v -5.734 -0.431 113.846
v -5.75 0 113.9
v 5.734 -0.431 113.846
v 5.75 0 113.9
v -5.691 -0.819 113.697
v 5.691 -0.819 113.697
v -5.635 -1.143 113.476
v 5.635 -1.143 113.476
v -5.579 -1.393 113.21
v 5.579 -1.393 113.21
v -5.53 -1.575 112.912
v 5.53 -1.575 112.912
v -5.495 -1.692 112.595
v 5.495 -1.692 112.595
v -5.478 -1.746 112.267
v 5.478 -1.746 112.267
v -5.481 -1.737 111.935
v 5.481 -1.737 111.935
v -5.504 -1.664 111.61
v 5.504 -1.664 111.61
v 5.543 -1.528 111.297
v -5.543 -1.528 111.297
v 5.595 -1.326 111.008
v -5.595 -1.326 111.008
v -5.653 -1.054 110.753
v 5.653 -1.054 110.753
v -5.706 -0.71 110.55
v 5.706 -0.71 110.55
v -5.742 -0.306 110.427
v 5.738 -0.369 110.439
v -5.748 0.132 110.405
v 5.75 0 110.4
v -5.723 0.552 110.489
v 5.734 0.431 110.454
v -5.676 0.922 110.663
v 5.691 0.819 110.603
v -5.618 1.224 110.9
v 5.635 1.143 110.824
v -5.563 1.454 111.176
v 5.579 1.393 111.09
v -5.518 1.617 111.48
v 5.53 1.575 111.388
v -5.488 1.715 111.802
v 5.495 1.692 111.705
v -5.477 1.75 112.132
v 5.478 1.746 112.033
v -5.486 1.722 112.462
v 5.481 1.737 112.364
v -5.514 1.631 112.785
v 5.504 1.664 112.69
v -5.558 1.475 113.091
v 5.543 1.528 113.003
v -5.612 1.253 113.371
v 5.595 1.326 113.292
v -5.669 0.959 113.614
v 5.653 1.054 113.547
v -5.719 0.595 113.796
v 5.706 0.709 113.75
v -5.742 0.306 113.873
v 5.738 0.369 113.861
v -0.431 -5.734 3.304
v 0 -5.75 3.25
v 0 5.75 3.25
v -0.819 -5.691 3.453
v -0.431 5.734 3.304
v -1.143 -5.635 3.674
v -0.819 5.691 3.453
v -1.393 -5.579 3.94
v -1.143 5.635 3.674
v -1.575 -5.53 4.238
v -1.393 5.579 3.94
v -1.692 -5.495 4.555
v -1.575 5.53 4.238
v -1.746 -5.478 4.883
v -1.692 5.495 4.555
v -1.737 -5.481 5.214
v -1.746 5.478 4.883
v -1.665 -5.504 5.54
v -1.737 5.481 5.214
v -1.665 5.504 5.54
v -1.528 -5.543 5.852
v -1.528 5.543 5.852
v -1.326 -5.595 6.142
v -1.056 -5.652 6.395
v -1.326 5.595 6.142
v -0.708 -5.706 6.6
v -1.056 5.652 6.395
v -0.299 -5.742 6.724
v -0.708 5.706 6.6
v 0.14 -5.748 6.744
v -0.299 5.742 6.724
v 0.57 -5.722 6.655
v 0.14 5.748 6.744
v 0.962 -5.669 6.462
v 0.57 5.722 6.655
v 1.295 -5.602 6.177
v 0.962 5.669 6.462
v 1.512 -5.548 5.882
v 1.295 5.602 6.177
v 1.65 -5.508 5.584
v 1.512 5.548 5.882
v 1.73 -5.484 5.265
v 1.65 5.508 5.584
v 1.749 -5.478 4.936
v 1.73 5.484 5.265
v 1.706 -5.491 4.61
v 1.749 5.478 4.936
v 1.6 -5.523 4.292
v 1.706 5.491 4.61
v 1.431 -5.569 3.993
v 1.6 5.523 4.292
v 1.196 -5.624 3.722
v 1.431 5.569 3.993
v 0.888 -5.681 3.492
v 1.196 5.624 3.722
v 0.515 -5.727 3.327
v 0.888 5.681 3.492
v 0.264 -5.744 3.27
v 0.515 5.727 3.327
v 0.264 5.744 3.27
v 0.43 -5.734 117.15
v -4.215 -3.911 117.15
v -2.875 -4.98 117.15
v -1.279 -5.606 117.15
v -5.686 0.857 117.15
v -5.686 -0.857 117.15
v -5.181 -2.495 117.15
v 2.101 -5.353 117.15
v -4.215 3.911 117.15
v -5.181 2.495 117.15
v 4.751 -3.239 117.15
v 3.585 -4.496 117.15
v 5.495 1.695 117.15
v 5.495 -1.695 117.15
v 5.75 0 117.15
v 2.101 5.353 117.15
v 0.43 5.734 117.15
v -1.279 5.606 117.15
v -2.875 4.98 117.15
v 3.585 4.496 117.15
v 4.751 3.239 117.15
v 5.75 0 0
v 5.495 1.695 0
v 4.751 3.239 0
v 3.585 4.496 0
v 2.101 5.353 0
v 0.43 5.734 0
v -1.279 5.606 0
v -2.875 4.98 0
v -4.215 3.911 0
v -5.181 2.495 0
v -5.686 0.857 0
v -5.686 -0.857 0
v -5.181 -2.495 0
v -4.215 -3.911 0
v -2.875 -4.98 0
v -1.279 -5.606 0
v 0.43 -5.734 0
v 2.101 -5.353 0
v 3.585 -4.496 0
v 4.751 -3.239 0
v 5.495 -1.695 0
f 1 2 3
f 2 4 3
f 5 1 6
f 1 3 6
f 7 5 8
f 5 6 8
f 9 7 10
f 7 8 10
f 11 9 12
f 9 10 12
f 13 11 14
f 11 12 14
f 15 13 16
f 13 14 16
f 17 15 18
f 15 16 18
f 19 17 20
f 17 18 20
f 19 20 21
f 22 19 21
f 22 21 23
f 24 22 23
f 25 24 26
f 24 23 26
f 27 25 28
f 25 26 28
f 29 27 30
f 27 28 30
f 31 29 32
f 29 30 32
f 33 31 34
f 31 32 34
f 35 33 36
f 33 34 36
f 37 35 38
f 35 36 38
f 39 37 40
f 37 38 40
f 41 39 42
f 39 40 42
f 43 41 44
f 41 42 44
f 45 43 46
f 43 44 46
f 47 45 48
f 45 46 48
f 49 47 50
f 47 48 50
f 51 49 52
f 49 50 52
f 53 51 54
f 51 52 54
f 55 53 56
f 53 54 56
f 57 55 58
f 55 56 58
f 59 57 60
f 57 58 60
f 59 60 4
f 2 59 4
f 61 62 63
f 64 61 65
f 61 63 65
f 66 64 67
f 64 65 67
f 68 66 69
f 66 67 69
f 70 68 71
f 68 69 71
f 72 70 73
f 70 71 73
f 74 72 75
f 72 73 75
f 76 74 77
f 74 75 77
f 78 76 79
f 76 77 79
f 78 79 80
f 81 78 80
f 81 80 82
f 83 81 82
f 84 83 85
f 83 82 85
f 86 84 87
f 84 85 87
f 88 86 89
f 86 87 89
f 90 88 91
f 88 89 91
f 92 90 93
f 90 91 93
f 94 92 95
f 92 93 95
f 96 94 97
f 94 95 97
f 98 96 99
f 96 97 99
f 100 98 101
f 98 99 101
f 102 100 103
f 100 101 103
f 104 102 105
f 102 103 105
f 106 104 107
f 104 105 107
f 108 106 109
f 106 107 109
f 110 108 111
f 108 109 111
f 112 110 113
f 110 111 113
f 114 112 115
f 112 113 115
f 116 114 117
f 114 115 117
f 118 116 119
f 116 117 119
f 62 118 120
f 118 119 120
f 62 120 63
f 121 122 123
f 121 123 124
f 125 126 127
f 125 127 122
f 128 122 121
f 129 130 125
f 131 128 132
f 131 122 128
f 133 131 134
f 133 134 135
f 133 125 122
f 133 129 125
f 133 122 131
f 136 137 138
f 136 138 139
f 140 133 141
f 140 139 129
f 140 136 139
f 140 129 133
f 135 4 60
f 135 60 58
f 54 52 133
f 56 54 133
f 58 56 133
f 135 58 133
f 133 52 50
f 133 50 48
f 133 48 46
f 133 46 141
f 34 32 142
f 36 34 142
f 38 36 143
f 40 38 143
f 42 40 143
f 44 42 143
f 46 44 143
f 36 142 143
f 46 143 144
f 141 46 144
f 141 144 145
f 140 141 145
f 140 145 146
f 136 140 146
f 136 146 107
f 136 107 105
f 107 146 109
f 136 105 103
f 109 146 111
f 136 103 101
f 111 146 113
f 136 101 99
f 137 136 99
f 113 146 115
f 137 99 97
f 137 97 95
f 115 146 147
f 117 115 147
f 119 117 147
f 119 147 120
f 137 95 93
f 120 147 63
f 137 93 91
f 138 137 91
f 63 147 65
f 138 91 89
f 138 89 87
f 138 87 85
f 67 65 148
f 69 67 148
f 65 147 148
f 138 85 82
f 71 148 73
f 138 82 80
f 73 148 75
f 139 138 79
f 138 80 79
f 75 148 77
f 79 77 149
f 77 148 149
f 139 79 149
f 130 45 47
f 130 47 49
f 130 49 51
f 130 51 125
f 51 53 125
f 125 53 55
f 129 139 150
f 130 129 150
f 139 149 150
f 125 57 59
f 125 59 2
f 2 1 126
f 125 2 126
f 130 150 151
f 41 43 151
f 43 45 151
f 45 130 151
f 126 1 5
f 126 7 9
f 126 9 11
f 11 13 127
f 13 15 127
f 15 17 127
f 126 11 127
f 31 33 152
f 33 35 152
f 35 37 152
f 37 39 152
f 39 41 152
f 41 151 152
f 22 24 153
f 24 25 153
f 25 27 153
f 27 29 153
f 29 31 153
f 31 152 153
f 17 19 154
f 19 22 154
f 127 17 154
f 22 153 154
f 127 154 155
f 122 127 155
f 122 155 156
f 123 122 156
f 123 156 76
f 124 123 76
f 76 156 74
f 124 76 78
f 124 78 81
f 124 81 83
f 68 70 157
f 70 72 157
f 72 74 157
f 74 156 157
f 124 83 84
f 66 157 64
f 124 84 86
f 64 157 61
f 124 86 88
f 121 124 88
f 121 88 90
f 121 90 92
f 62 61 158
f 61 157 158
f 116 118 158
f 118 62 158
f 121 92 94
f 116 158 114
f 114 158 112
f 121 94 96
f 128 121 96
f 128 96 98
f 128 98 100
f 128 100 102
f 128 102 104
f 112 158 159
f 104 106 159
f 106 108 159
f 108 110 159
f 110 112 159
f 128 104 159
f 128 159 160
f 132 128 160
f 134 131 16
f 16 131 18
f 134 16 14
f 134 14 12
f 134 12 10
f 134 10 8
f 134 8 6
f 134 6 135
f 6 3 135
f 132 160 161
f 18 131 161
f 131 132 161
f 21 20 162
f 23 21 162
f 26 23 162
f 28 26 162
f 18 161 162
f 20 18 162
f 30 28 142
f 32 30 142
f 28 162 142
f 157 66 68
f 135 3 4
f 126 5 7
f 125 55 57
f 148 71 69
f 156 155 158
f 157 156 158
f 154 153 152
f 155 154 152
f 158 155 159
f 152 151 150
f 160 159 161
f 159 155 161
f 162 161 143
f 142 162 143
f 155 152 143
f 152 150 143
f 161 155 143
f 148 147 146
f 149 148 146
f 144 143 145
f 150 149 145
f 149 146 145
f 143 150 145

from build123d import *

# Parameters (mm, degrees)
SKETCH3_R           = 5.75
BOSS_EXTRUDE1_DEPTH = 117.15
SKETCH4_R           = 1.75
CUT_EXTRUDE2_DEPTH  = 15
SKETCH5_R           = 1.75
CUT_EXTRUDE3_DEPTH  = 15


with BuildPart() as part:
    # Sketch3 → Boss-Extrude1 (new body)
    with BuildSketch(Plane.XY):
        Circle(SKETCH3_R)
    extrude(amount=BOSS_EXTRUDE1_DEPTH)

    # Sketch4 → Cut-Extrude2 (cut, symmetric)
    with BuildSketch(Plane(origin=(0, 0, 0), x_dir=(1, 0, 0), z_dir=(0, 1, 0))):
        with Locations(Location((0, -5, 0), (0, 0, 90))):
            Circle(SKETCH4_R)
    extrude(amount=CUT_EXTRUDE2_DEPTH, both=True, mode=Mode.SUBTRACT)

    # Sketch5 → Cut-Extrude3 (cut, symmetric)
    with BuildSketch(Plane(origin=(0, 0, 0), x_dir=(0, 0, -1), z_dir=(1, 0, 0))):
        with Locations(Location((-112.15, 0, 0), (0, 0, 179.999999999))):
            Circle(SKETCH5_R)
    extrude(amount=CUT_EXTRUDE3_DEPTH, both=True, mode=Mode.SUBTRACT)


solid = part.part
